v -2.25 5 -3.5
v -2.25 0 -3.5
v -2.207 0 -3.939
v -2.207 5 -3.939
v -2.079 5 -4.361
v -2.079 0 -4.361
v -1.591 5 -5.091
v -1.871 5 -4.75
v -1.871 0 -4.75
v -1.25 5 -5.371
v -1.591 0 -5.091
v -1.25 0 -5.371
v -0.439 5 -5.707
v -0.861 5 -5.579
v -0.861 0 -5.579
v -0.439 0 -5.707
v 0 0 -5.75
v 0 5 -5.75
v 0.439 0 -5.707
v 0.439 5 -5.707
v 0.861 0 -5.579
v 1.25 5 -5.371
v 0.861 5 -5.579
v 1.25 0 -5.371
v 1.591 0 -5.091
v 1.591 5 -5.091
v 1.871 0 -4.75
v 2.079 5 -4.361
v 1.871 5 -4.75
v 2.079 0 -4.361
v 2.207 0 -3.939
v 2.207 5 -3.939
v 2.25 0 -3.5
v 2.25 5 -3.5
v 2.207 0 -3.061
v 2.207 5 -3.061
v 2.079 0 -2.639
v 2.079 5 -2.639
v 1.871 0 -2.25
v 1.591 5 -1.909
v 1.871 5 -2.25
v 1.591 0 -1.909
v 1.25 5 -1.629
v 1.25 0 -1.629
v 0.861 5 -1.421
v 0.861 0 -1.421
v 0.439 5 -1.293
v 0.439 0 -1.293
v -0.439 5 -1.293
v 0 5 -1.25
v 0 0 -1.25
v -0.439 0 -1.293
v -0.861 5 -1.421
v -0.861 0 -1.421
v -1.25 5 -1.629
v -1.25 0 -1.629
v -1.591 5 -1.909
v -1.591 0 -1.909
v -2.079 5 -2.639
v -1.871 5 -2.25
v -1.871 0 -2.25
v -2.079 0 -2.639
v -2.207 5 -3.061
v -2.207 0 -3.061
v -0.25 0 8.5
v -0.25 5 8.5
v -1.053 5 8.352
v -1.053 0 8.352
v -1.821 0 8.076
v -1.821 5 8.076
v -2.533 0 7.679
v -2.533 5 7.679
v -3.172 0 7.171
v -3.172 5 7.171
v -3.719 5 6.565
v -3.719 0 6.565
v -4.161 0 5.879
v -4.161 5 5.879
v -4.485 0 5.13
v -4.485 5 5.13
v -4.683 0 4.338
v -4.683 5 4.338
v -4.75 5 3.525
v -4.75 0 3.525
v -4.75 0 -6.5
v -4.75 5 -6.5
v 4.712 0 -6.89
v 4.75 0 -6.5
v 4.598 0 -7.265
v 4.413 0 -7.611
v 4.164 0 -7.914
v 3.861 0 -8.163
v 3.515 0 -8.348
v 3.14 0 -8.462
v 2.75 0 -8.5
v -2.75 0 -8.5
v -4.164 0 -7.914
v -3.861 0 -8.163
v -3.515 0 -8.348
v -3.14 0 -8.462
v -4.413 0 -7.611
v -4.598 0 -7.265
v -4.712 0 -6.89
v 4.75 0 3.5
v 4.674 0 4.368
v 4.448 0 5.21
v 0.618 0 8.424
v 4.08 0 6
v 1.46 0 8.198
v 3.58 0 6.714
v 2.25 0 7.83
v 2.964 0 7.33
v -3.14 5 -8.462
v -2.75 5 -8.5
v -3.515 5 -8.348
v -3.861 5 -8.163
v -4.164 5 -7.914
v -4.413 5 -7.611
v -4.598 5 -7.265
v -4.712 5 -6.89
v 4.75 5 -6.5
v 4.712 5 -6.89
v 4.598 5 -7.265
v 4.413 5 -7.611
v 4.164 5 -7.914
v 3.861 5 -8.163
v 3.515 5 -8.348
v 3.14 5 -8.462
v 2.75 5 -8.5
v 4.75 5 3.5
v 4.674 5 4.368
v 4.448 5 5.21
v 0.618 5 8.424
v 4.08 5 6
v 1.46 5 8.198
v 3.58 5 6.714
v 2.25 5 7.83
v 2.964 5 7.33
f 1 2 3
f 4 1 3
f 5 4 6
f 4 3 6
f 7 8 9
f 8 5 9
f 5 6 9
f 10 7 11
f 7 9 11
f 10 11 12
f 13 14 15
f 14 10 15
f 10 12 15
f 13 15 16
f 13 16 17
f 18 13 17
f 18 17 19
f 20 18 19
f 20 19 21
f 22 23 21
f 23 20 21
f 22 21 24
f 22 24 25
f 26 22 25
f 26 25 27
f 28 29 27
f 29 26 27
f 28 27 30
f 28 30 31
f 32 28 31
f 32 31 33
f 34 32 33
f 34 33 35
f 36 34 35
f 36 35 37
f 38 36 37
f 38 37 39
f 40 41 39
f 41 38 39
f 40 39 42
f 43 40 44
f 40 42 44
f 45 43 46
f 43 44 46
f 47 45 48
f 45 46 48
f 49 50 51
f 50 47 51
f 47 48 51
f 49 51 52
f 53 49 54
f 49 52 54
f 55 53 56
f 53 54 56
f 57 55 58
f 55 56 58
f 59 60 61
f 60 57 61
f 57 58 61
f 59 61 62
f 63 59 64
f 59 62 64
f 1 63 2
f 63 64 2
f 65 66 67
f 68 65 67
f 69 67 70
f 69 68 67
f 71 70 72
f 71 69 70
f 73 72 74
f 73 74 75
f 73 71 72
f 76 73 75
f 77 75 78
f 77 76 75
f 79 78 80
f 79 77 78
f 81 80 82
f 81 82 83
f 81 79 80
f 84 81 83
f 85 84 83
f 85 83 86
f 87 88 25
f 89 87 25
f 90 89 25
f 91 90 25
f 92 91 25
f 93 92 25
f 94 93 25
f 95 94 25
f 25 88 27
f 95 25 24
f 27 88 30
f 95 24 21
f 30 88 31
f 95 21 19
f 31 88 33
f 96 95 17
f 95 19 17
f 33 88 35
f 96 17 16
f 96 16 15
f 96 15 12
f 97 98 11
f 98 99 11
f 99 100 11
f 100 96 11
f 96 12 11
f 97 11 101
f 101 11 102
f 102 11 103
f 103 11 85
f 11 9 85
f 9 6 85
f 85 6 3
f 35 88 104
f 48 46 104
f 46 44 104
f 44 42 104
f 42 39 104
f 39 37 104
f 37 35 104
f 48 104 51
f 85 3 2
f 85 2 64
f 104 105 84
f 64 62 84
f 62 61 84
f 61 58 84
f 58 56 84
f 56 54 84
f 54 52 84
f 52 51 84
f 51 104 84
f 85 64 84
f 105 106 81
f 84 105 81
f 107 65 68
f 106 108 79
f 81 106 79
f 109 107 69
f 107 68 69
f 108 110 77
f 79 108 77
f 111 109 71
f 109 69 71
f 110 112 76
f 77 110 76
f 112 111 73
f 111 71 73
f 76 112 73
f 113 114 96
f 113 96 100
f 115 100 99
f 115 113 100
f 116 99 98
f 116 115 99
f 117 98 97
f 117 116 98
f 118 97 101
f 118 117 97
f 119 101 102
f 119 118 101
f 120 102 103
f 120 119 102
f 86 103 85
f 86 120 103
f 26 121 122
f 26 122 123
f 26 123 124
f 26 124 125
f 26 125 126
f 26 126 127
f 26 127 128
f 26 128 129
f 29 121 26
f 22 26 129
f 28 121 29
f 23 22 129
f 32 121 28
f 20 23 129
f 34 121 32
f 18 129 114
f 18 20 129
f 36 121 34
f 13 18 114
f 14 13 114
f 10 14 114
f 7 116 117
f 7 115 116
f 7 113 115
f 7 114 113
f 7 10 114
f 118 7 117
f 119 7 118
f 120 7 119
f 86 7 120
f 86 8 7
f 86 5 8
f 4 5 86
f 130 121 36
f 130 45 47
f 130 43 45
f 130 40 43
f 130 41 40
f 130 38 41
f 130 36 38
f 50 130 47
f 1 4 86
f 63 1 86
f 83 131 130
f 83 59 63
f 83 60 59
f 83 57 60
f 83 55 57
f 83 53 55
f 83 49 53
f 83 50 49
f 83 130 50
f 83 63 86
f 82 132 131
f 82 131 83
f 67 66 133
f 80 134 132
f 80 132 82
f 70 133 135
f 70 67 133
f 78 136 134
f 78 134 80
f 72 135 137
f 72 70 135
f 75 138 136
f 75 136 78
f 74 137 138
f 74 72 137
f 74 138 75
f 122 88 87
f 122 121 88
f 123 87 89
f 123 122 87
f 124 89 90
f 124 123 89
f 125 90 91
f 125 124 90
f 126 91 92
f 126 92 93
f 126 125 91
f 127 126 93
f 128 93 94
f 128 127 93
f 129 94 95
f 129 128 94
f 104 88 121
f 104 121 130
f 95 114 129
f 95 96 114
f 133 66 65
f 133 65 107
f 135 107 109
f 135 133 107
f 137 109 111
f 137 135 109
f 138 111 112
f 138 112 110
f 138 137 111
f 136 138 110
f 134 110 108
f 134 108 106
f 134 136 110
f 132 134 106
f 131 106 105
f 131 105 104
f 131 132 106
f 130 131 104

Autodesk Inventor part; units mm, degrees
ref_plane "YZ Plane" through (0, 0, 0) normal (1, 0, 0) x (0, 1, 0)
ref_plane "XZ Plane" through (0, 0, 0) normal (0, 1, 0) x (-1, 0, 0)
ref_plane "XY Plane" through (0, 0, 0) normal (0, 0, 1) x (1, 0, 0)
sketch "Sketch1" plane through (0, 0, 0) normal (0, 1, 0) x (-1, 0, 0)
  line L0 (-4.75, 8.5) -> (4.75, 8.5)
  line L1 (4.75, 8.5) -> (4.75, -8.5)
  line L2 (4.75, -8.5) -> (-4.75, -8.5)
  line L3 (-4.75, -8.5) -> (-4.75, 8.5)
  line L4 (-4.75, 8.5) -> (4.75, -8.5) construction
  line L5 (4.75, 8.5) -> (-4.75, -8.5) construction
  line L6 (0, -8.5) -> (0, -3.5) construction
  circle A0 centre (0, -3.5) radius 2.25
  point P0 (0, 0)
  dimension "d2" = 9.5
  dimension "d3" = 17
  dimension "d4" = 5
  dimension "d5" = 4.5
extrude "Extrusion1" add sketch "Sketch1" along normal blind 5
fillet "Fillet1" radius 5 1 edges at (4.75, 2.5, 8.5)
fillet "Fillet2" radius 5 1 edges at (-4.75, 2.5, 8.5)
fillet "Fillet3" radius 2 2 edges at (-4.75, 2.5, -8.5) (4.75, 2.5, -8.5)
properties part number "Clamp"
